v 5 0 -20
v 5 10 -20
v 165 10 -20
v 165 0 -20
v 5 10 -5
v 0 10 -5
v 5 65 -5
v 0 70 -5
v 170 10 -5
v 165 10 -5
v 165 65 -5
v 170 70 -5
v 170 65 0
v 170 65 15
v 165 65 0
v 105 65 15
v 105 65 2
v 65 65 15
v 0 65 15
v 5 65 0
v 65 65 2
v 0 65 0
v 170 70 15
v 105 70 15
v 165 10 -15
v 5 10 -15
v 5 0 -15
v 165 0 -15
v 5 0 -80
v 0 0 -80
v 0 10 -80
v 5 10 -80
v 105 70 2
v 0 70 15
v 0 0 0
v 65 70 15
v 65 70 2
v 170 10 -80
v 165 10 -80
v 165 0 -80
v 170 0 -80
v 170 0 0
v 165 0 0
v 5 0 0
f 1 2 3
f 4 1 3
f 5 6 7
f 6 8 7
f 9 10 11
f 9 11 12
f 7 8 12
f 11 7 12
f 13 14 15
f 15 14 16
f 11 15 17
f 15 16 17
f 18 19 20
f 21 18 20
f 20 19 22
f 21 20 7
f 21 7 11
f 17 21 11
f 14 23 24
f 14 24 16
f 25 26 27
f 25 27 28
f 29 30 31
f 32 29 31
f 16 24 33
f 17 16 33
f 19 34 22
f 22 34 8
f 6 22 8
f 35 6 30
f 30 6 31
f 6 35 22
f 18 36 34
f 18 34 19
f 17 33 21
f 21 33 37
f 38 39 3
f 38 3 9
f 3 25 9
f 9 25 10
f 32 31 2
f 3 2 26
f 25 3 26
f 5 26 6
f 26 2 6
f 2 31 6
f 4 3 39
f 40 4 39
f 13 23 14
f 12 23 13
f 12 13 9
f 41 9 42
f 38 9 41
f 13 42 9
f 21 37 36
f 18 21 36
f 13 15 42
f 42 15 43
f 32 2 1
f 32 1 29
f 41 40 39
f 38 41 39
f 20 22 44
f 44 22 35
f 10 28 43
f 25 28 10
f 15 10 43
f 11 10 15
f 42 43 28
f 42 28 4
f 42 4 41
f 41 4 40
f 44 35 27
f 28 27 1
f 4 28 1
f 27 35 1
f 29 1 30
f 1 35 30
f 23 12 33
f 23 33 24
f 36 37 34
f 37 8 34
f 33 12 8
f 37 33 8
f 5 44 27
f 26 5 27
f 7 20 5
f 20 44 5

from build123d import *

# Parameters (mm, degrees)
EXTRUDE_2_DEPTH     = 170
SKETCH_5_W          = 160
SKETCH_5_H          = 60
CUT_EXTRUDE_2_DEPTH = 10
SKETCH_6_W          = 160
SKETCH_6_H          = 10
CUT_EXTRUDE_3_DEPTH = 10
SKETCH_7_W          = 160
SKETCH_7_H          = 55
CUT_EXTRUDE_4_DEPTH = 5
SKETCH_8_W          = 160
SKETCH_8_H          = 10
CUT_EXTRUDE_5_DEPTH = 5
CUT_EXTRUDE_6_DEPTH = 5


with BuildPart() as part:
    # 草图1 → 凸台-拉伸2 (new body)
    with BuildSketch(Plane(origin=(0, 0, 0), x_dir=(0, 0, -1), z_dir=(1, 0, 0))):
        Polygon((0, 0), (15, 0), (20, 0), (80, 0), (80, 10), (20, 10), (15, 10), (5, 10), (5, 70), (-15, 70), (-15, 65), (0, 65), align=None)
    extrude(amount=EXTRUDE_2_DEPTH)

    # 草图5 → 切除-拉伸2 (cut)
    with BuildSketch(Plane(origin=(0, 10, 0), x_dir=(1, 0, 0), z_dir=(0, 1, 0))):
        with Locations((85, 50)):
            Rectangle(SKETCH_5_W, SKETCH_5_H)
    extrude(amount=-CUT_EXTRUDE_2_DEPTH, mode=Mode.SUBTRACT)

    # 草图6 → 切除-拉伸3 (cut)
    with BuildSketch(Plane(origin=(0, 10, 0), x_dir=(1, 0, 0), z_dir=(0, 1, 0))):
        with Locations((85, 10)):
            Rectangle(SKETCH_6_W, SKETCH_6_H)
    extrude(amount=-CUT_EXTRUDE_3_DEPTH, mode=Mode.SUBTRACT)

    # 草图7 → 切除-拉伸4 (cut)
    with BuildSketch(Plane(origin=(0, 0, -5), x_dir=(-1, 0, 0), z_dir=(0, 0, -1))):
        with Locations((-85, 37.5)):
            Rectangle(SKETCH_7_W, SKETCH_7_H)
    extrude(amount=-CUT_EXTRUDE_4_DEPTH, mode=Mode.SUBTRACT)

    # 草图8 → 切除-拉伸5 (cut)
    with BuildSketch(Plane(origin=(0, 0, -5), x_dir=(-1, 0, 0), z_dir=(0, 0, -1))):
        with Locations((-85, 5)):
            Rectangle(SKETCH_8_W, SKETCH_8_H)
    extrude(amount=-CUT_EXTRUDE_5_DEPTH, mode=Mode.SUBTRACT)

    # 草图9 → 切除-拉伸6 (cut)
    with BuildSketch(Plane(origin=(0, 70, 0), x_dir=(1, 0, 0), z_dir=(0, 1, 0))):
        Polygon((85, -15), (105, -15), (105, -2), (65, -2), (65, -15), align=None)
    extrude(amount=-CUT_EXTRUDE_6_DEPTH, mode=Mode.SUBTRACT)


solid = part.part
